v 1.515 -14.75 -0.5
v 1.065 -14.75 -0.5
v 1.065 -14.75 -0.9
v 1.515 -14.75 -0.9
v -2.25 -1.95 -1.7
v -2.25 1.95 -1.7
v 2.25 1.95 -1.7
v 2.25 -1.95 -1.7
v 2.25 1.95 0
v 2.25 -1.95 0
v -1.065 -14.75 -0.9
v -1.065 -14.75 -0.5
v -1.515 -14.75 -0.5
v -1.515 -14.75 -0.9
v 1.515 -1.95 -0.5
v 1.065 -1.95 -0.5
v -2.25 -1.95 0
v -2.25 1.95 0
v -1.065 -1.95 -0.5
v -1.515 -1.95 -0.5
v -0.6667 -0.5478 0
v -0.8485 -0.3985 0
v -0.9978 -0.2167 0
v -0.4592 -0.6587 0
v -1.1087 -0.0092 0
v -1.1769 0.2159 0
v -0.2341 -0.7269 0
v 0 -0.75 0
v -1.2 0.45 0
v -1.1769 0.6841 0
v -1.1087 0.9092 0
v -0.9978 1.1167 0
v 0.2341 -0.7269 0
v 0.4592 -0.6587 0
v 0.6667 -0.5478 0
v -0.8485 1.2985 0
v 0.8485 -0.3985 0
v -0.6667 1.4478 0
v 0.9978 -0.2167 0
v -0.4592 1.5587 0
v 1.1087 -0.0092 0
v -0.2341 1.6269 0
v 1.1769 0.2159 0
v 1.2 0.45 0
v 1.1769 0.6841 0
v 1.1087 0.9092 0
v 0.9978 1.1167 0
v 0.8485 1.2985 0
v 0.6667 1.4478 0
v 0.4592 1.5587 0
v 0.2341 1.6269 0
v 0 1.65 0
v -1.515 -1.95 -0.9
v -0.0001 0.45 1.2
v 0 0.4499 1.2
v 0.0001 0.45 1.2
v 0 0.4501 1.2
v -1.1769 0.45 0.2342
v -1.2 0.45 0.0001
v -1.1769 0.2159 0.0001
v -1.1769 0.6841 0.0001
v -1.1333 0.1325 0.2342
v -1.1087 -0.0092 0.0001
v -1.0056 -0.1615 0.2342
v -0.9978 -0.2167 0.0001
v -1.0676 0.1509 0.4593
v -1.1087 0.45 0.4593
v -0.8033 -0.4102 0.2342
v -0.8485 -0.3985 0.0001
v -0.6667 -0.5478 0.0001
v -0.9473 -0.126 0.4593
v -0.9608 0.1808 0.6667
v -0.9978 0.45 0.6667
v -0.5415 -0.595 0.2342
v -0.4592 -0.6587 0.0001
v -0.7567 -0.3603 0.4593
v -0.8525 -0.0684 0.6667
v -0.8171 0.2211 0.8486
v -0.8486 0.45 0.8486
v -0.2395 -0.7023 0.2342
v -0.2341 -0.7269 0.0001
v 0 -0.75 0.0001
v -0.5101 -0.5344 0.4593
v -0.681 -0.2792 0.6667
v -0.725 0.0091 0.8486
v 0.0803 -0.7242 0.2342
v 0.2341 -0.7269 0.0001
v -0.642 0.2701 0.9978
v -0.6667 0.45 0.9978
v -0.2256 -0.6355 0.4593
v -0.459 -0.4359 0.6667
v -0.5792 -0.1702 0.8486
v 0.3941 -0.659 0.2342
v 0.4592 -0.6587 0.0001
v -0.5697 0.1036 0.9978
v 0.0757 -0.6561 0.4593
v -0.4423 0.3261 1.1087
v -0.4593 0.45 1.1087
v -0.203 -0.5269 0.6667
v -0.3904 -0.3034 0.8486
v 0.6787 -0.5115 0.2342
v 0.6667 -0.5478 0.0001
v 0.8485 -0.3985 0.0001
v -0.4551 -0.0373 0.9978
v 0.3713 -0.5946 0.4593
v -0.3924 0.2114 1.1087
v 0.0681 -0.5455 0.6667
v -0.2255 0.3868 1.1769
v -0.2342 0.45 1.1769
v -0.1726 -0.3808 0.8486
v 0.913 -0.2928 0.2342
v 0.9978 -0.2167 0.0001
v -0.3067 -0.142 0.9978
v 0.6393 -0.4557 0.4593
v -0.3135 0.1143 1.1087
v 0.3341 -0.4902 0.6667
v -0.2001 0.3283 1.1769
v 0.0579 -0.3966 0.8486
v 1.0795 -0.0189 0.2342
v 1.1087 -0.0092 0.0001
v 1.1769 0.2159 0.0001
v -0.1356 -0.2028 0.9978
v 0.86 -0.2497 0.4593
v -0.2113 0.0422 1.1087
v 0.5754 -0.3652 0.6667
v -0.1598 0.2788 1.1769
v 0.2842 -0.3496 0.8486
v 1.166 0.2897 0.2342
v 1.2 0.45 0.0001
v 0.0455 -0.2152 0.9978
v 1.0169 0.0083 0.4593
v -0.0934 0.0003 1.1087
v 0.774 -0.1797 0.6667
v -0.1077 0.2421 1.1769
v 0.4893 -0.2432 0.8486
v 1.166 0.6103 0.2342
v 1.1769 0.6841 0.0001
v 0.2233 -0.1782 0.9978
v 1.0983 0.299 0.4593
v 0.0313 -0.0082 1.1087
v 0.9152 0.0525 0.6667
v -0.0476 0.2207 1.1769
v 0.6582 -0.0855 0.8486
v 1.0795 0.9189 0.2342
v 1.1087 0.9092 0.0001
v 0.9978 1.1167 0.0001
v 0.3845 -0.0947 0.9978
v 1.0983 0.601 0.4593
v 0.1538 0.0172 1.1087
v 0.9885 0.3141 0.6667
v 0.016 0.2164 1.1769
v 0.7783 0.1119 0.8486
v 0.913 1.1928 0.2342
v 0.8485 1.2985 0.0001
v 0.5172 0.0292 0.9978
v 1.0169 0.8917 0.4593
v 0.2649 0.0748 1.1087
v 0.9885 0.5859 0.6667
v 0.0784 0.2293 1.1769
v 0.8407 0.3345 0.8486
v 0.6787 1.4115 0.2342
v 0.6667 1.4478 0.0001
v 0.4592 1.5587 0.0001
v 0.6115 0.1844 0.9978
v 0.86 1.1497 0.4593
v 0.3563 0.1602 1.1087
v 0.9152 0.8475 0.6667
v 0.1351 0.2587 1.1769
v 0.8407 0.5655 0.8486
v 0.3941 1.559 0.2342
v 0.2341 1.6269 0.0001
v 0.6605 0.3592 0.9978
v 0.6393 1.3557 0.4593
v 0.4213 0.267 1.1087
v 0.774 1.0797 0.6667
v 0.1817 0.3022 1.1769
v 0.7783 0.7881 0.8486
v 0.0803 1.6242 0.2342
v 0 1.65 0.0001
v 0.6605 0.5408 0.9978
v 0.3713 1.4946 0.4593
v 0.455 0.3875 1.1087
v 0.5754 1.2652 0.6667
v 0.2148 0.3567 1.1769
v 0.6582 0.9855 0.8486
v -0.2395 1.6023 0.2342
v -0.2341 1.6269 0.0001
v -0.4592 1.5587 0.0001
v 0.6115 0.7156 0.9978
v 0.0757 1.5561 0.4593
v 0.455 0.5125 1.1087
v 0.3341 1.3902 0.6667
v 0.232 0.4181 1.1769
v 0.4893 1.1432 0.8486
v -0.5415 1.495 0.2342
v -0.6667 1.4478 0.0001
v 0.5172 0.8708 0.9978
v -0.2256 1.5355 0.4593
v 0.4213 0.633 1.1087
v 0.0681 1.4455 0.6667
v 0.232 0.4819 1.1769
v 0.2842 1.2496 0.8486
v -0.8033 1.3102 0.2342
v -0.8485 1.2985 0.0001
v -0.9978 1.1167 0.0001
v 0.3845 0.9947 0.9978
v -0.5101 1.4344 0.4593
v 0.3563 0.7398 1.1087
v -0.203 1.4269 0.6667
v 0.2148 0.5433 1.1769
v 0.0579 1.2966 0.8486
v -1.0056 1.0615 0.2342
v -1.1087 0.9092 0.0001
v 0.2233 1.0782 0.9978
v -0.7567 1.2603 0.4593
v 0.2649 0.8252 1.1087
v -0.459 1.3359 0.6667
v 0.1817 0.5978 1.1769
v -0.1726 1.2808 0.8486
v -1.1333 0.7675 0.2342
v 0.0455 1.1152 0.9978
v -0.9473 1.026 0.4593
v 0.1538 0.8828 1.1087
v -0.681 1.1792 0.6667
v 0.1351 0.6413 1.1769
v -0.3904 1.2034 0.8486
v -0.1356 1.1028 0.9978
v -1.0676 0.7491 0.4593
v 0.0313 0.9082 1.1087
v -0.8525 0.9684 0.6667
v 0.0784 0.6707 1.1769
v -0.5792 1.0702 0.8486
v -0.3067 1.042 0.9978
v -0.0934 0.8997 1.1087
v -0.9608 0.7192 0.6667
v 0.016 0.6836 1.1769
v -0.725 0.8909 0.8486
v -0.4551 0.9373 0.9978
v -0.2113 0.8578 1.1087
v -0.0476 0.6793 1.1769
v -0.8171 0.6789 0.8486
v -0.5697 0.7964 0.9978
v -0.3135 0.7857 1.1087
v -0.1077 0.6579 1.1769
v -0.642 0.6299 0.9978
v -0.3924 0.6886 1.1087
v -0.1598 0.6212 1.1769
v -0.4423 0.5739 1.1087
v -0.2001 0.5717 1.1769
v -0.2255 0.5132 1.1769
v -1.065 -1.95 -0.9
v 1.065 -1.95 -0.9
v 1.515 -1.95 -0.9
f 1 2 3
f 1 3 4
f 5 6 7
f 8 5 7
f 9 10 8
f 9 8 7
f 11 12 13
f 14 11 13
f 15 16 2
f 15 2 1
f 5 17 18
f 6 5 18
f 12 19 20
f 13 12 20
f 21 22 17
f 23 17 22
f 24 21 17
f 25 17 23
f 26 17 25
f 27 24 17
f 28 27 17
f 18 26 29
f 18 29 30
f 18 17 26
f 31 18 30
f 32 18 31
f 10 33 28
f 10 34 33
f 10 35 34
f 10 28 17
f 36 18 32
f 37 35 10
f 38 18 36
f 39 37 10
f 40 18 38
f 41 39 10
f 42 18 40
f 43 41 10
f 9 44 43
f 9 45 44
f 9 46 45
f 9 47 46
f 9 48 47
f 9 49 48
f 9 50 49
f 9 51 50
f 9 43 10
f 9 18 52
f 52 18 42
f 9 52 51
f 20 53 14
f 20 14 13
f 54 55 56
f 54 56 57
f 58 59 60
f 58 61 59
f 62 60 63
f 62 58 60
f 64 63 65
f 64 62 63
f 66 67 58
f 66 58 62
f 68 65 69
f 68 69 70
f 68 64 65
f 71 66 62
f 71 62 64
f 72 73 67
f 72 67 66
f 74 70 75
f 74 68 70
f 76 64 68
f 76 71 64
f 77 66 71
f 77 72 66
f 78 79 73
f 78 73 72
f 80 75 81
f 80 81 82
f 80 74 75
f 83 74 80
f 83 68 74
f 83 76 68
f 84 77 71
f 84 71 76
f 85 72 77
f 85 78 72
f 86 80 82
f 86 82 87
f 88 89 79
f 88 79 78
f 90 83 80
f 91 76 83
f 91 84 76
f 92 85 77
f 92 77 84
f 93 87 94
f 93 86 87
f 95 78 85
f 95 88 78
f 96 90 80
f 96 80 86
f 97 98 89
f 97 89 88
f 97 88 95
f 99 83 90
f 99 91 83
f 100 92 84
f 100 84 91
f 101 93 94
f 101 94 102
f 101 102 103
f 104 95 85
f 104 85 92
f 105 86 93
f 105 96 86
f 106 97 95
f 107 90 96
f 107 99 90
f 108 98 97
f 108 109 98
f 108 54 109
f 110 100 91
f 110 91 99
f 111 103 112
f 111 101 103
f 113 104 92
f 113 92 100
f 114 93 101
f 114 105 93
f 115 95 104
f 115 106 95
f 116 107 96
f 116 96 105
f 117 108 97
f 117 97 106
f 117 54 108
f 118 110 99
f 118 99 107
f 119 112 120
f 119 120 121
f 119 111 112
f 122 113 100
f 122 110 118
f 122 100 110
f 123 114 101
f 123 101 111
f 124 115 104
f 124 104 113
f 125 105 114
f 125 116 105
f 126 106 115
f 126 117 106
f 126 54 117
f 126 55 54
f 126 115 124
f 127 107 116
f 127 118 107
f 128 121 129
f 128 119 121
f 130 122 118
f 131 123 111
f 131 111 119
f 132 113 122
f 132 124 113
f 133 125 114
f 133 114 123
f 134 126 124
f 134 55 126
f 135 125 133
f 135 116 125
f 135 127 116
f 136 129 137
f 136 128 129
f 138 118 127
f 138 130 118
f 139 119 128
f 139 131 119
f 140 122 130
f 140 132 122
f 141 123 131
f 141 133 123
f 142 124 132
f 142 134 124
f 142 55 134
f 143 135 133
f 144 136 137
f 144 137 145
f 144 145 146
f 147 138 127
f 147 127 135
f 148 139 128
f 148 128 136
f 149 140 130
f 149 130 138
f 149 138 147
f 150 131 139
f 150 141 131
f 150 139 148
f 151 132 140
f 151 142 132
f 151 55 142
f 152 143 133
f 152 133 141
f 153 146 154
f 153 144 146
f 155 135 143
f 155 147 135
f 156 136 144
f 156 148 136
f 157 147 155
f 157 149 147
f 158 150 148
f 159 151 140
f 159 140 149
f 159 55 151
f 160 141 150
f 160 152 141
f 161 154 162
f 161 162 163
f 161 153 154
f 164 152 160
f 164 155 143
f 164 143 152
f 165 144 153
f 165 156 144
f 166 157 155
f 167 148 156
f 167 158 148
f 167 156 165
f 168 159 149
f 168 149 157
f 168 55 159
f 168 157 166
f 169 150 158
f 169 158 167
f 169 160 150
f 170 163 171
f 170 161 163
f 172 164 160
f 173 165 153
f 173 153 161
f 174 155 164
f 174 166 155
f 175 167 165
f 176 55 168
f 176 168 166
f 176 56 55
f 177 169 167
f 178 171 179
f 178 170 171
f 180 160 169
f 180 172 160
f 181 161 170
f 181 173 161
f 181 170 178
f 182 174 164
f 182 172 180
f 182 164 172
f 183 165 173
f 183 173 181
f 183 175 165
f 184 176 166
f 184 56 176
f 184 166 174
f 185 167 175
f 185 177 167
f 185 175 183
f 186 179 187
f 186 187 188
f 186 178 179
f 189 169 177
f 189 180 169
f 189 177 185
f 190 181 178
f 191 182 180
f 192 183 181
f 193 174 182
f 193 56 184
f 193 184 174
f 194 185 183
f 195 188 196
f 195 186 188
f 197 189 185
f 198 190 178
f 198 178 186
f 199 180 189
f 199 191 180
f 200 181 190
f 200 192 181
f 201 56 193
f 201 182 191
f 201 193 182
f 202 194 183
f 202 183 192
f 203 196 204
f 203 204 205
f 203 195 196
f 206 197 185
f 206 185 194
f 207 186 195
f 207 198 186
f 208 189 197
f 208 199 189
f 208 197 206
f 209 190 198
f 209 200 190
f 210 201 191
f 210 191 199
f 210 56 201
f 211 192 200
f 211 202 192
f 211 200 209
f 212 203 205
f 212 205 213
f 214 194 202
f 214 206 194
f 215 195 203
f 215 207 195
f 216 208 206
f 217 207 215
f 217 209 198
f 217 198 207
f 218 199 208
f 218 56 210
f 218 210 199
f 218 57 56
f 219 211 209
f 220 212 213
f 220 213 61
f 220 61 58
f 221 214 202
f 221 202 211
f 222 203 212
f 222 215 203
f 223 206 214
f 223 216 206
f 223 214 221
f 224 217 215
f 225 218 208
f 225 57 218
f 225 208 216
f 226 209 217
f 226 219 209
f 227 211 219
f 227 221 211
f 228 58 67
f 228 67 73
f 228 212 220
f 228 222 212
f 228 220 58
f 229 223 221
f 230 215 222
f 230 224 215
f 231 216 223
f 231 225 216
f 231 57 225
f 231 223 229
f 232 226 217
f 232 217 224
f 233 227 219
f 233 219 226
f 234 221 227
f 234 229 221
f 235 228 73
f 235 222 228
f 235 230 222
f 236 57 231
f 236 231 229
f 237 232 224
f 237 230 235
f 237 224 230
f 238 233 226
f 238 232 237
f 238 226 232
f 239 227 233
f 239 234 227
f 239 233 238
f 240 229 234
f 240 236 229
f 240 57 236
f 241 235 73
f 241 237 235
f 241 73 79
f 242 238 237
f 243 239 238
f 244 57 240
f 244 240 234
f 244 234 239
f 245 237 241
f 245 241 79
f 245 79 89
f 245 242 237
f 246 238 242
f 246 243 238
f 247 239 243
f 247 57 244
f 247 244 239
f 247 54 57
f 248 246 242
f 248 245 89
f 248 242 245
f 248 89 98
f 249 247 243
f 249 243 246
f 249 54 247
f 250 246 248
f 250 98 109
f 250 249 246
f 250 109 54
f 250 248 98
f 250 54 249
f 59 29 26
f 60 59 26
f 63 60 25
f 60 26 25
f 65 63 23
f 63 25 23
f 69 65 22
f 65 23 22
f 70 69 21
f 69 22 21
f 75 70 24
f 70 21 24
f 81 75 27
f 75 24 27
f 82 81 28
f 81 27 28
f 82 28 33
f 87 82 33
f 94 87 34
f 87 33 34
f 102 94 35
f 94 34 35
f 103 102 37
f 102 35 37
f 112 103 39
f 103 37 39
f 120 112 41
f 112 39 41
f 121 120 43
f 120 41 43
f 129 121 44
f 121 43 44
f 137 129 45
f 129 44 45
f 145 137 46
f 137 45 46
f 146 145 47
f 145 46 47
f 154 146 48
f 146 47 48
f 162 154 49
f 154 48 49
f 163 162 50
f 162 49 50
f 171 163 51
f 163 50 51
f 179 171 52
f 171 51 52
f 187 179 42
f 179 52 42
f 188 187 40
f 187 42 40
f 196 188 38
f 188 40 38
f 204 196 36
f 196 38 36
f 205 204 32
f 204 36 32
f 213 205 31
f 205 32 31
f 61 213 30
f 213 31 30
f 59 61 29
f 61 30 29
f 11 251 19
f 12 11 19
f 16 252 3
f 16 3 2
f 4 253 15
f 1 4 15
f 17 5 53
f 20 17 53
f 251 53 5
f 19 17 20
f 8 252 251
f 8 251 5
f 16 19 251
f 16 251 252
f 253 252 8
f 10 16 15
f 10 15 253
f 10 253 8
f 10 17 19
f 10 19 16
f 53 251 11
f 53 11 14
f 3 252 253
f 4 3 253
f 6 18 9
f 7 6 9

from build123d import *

# Parameters (mm, degrees)
SKETCH1_W           = 4.5
SKETCH1_H           = 3.9
BOSS_EXTRUDE1_DEPTH = 1.7
SKETCH2_R           = 1.2
BOSS_EXTRUDE2_DEPTH = 1.2
FILLET1_R           = 1.2
SKETCH3_W           = 0.45
SKETCH3_H           = 0.4
BOSS_EXTRUDE3_DEPTH = 12.8


with BuildPart() as part:
    # Sketch1 → Boss-Extrude1 (new body)
    with BuildSketch(Plane.XY):
        Rectangle(SKETCH1_W, SKETCH1_H)
    extrude(amount=-BOSS_EXTRUDE1_DEPTH)

    # Sketch2 → Boss-Extrude2 (add)
    with BuildSketch(Plane.XY):
        with Locations(Location((0, 0.45, 0), (0, 0, 180))):
            Circle(SKETCH2_R)
    extrude(amount=BOSS_EXTRUDE2_DEPTH)

    # Fillet1
    fillet1_edges = [part.edges().sort_by_distance(p)[0] for p in [
        (1.2, 0.45, 1.2),
    ]]
    fillet(fillet1_edges, radius=FILLET1_R - 0.0001)  # a hair under: the kernel refuses the full size

    # Sketch3 → Boss-Extrude3 (add)
    with BuildSketch(Plane.XZ.offset(1.95)):
        with Locations((1.29, -0.7)):
            Rectangle(SKETCH3_W, SKETCH3_H)
    boss_extrude3 = extrude(amount=BOSS_EXTRUDE3_DEPTH)

    # Mirror1: Boss-Extrude3 across plane
    add(boss_extrude3.mirror(Plane(origin=(0, 0, 0), x_dir=(0, 0, 1), z_dir=(1, 0, 0))))


solid = part.part
